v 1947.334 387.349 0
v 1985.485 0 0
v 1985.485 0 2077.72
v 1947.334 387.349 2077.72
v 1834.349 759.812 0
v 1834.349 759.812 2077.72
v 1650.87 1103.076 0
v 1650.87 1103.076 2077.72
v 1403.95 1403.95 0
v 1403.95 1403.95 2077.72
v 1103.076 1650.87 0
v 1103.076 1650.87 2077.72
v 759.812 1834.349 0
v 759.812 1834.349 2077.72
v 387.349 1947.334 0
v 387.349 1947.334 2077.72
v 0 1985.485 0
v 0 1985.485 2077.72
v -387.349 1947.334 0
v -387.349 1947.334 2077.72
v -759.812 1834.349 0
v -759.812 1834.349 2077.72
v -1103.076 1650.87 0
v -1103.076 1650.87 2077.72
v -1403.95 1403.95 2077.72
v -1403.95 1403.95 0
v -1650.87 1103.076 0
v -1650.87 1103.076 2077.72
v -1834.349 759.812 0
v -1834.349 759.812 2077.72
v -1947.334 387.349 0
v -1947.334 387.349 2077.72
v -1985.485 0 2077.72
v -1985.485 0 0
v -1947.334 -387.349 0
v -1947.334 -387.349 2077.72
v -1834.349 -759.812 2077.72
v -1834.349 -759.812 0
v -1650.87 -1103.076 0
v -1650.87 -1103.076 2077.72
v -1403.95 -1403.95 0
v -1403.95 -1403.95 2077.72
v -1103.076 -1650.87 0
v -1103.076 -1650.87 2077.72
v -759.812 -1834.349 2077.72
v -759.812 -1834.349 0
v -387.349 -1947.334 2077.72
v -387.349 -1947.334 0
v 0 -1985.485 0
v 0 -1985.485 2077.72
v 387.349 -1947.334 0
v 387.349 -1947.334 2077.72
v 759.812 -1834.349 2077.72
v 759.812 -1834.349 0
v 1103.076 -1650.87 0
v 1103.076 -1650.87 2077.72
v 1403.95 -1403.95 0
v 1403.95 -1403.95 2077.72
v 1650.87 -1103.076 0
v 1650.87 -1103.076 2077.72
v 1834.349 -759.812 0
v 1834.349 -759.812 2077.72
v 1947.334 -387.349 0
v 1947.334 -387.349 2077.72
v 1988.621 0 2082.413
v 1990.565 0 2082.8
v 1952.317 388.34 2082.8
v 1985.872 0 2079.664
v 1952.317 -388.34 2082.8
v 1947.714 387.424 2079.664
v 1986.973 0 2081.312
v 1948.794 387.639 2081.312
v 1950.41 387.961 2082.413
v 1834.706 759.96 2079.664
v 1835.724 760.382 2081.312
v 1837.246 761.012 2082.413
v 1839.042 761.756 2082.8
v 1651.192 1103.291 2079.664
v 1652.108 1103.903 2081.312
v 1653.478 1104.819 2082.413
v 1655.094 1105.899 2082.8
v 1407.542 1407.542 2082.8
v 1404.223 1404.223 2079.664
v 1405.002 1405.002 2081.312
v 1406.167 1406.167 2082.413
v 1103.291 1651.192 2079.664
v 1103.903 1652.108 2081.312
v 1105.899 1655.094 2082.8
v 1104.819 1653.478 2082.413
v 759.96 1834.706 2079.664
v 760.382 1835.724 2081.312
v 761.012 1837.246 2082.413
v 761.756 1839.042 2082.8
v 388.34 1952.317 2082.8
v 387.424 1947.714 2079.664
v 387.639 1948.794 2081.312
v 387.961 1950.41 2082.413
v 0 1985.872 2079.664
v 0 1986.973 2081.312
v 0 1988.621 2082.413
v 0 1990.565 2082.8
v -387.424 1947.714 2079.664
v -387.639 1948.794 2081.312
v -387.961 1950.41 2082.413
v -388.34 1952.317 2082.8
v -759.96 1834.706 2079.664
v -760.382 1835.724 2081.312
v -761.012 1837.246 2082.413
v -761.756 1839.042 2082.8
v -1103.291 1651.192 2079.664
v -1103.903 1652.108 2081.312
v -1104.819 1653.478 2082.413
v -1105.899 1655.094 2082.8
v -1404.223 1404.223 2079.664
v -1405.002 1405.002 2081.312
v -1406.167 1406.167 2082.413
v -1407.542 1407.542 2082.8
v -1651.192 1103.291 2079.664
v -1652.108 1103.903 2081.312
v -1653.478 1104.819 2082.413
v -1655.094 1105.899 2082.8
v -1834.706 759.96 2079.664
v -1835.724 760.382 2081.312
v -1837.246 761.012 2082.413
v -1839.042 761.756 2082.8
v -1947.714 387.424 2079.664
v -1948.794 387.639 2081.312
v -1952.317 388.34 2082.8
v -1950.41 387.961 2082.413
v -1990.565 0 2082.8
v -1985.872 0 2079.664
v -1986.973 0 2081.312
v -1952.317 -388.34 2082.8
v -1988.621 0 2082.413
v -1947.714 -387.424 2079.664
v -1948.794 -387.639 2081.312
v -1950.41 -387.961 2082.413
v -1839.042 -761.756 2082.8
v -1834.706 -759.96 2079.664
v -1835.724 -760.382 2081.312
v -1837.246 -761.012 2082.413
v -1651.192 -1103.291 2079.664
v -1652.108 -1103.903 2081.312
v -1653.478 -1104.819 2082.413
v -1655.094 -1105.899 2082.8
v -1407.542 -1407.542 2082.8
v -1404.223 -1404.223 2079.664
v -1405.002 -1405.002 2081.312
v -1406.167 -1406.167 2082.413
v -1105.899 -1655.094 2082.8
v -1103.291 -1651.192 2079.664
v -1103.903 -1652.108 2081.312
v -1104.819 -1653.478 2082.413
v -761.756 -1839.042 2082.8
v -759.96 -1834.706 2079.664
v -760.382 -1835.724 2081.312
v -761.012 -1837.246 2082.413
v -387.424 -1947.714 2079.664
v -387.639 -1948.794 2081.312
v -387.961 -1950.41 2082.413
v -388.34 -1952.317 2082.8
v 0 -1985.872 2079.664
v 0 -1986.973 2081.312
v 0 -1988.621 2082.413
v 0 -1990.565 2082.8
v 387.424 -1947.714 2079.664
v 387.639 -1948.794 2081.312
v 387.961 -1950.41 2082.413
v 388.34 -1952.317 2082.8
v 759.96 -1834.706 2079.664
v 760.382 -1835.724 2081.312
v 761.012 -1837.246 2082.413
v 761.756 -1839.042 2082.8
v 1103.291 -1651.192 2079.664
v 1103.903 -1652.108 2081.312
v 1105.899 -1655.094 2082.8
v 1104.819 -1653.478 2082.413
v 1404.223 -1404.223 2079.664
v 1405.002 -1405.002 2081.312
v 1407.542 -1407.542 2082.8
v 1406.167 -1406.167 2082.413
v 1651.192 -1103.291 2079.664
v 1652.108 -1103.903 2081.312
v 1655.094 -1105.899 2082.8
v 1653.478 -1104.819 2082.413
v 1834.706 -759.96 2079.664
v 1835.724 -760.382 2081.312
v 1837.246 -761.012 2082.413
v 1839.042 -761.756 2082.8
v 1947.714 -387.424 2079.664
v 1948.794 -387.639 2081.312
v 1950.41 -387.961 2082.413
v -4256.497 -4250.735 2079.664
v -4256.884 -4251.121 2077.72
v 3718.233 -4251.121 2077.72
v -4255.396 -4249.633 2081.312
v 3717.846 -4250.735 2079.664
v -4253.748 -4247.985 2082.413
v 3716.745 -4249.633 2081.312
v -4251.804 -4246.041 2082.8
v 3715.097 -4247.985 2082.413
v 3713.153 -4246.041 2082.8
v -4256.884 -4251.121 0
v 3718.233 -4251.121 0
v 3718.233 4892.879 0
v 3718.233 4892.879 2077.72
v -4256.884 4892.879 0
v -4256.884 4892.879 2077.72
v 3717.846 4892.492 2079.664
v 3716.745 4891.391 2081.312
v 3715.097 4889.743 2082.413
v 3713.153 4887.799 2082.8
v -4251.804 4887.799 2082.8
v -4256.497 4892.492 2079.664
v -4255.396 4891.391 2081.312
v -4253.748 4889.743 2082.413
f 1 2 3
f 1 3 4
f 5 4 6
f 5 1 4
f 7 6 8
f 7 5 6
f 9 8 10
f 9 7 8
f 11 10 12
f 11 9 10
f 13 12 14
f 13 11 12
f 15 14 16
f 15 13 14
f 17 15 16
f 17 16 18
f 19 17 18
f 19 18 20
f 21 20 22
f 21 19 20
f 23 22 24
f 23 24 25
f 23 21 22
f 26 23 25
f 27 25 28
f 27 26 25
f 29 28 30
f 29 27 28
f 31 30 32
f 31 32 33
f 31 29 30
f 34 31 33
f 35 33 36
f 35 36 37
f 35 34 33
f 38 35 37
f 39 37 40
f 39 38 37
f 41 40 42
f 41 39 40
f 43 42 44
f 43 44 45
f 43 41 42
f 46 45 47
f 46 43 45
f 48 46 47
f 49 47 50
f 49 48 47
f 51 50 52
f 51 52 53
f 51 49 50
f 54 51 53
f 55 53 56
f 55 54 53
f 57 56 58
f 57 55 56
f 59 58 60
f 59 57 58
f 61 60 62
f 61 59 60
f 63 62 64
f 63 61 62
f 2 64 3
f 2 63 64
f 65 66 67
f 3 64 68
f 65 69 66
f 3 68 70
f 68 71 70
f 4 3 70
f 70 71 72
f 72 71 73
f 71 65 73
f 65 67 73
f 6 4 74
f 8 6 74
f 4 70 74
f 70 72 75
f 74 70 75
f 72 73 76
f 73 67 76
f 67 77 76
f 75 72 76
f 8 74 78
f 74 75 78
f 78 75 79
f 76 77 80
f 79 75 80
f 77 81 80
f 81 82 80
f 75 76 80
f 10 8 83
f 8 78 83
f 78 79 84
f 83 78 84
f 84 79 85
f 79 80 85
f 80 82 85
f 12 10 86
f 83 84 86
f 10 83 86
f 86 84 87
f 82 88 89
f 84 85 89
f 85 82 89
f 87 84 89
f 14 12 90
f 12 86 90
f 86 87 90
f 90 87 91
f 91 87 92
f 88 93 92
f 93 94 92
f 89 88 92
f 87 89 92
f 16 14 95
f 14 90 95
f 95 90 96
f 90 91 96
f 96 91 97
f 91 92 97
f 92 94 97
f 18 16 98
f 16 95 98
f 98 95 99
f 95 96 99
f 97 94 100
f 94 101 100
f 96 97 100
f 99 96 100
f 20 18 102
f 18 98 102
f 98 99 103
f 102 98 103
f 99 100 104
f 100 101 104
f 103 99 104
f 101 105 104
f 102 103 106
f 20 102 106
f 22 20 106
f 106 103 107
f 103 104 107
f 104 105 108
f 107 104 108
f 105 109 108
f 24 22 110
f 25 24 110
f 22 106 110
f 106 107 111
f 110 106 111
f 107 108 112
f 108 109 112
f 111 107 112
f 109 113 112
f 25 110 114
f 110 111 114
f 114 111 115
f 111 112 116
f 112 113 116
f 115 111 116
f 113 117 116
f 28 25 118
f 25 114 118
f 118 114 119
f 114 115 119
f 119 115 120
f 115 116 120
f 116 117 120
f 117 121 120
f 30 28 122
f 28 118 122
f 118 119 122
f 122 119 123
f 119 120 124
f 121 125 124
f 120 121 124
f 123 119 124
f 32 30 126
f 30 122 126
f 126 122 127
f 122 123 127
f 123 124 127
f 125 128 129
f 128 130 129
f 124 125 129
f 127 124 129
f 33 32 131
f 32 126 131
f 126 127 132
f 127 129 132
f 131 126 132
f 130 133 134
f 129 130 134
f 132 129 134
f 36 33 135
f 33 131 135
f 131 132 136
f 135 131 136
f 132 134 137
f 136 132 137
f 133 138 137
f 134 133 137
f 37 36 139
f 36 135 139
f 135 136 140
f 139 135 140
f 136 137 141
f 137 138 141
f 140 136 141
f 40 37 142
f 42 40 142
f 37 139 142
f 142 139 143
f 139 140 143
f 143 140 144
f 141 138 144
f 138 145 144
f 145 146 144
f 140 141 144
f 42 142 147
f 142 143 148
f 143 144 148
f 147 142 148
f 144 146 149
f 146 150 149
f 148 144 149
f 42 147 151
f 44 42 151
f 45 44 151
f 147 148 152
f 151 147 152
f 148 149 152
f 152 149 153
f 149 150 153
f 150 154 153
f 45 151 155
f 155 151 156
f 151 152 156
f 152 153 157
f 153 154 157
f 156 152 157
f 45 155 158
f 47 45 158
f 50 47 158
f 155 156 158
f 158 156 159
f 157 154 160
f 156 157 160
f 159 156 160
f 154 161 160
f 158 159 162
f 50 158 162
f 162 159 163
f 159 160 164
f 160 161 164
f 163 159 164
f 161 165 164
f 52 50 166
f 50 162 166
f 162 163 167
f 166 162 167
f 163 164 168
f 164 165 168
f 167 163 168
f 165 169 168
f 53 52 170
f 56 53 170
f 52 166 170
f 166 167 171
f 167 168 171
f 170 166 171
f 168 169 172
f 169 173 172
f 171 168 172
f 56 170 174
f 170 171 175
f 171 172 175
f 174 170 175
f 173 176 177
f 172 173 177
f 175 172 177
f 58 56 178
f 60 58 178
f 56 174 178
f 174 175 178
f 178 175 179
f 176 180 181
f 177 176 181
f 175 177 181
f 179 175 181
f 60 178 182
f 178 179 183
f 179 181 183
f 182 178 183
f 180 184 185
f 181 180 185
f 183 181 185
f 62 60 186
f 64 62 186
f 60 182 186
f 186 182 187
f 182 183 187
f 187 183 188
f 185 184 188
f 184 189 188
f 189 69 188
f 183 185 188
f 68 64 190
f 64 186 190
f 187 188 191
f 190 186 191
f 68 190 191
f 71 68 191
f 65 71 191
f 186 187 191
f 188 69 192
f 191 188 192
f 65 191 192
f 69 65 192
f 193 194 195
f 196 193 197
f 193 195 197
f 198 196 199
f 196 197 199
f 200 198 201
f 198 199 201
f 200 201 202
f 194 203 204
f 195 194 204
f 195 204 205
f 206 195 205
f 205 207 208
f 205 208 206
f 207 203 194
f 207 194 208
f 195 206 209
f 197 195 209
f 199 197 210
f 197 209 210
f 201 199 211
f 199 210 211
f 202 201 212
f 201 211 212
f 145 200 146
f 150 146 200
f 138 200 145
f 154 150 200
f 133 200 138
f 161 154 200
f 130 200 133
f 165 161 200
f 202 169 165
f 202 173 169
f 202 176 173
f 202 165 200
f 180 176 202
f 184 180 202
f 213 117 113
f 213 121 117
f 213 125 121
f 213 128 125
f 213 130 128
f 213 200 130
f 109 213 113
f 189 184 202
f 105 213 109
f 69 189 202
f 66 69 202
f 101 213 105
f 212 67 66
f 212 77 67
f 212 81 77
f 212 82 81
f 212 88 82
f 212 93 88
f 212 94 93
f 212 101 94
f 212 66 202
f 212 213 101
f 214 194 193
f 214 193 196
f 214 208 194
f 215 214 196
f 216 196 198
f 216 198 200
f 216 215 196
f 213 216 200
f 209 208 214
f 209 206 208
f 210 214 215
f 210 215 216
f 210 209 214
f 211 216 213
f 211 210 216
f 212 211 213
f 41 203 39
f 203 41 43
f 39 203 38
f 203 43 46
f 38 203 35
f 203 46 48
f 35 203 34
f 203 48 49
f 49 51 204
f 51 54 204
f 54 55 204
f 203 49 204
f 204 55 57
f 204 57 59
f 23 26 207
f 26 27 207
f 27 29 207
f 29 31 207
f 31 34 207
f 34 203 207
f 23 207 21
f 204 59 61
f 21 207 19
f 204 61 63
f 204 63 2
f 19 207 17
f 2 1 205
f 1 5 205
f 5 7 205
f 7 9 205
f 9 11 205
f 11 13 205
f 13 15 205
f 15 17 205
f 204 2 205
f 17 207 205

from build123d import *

# Parameters (mm, degrees)
F0_W     = 7975.116693
F0_H     = 9144
F0_R     = 1985.484924
F1_DEPTH = 2082.8
F2_R     = 5.08


with BuildPart() as f1:
    # F0 (on Top) → F1 (new body)
    with BuildSketch(Plane.XY):
        with Locations((-269.325628, 320.878746)):
            Rectangle(F0_W, F0_H)
        Circle(F0_R, mode=Mode.SUBTRACT)
    extrude(amount=F1_DEPTH)

    # F2
    f2_edges = [f1.edges().sort_by_distance(p)[0] for p in [
        (-269.325628, 4892.878746, 2082.8),
        (-4256.883975, 320.878746, 2082.8),
        (-269.325628, -4251.121254, 2082.8),
        (3718.232718, 320.878746, 2082.8),
        (-1985.484924, 0, 2082.8),
    ]]
    fillet(f2_edges, radius=F2_R)


solid = f1.part
